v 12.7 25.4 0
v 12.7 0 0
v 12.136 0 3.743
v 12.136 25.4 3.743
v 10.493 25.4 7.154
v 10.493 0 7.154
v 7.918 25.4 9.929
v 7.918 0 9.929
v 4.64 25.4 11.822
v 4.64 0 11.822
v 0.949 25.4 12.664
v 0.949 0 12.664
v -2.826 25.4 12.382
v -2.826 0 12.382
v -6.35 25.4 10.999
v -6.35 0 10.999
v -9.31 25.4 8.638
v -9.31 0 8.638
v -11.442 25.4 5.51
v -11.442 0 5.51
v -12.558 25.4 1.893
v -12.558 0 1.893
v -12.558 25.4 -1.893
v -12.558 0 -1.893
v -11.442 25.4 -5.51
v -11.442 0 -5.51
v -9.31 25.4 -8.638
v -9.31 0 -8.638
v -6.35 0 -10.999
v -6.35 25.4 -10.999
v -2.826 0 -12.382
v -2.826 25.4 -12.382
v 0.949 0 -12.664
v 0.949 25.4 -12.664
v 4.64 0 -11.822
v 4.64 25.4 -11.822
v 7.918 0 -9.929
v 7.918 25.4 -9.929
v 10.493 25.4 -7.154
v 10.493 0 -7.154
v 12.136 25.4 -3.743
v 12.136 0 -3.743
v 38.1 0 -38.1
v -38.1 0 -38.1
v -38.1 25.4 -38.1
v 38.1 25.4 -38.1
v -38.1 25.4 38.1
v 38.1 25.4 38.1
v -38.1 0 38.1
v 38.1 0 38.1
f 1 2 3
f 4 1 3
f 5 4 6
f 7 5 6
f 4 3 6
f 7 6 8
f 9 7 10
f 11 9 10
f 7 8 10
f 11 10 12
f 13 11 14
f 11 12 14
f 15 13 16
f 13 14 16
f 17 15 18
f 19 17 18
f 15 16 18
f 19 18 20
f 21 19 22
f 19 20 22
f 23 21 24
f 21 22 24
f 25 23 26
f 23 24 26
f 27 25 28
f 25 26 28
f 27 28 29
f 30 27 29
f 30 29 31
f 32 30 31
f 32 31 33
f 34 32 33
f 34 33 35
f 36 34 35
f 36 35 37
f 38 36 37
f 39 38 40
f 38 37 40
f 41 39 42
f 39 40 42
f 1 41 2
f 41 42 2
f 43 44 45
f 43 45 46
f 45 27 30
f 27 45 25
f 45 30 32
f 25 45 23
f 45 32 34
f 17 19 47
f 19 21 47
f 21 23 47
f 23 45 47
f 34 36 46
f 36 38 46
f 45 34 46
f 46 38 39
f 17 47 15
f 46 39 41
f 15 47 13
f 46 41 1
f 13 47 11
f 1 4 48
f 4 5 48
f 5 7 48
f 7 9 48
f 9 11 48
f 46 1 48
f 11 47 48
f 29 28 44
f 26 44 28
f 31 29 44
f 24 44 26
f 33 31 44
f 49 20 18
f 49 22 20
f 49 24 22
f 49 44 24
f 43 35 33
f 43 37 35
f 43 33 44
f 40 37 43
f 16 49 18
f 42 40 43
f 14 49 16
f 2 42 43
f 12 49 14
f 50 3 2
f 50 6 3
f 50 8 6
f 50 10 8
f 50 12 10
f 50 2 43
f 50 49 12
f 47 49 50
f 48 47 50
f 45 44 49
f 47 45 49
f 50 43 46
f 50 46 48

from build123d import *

# Parameters (mm, degrees)
F0_W     = 76.2
F0_H     = 76.2
F0_R     = 12.7
F1_DEPTH = 25.4


with BuildPart() as f1:
    # F0 (on Front) → F1 (new body)
    with BuildSketch(Plane.XZ):
        Rectangle(F0_W, F0_H)
        Circle(F0_R, mode=Mode.SUBTRACT)
    extrude(amount=-F1_DEPTH)


solid = f1.part
